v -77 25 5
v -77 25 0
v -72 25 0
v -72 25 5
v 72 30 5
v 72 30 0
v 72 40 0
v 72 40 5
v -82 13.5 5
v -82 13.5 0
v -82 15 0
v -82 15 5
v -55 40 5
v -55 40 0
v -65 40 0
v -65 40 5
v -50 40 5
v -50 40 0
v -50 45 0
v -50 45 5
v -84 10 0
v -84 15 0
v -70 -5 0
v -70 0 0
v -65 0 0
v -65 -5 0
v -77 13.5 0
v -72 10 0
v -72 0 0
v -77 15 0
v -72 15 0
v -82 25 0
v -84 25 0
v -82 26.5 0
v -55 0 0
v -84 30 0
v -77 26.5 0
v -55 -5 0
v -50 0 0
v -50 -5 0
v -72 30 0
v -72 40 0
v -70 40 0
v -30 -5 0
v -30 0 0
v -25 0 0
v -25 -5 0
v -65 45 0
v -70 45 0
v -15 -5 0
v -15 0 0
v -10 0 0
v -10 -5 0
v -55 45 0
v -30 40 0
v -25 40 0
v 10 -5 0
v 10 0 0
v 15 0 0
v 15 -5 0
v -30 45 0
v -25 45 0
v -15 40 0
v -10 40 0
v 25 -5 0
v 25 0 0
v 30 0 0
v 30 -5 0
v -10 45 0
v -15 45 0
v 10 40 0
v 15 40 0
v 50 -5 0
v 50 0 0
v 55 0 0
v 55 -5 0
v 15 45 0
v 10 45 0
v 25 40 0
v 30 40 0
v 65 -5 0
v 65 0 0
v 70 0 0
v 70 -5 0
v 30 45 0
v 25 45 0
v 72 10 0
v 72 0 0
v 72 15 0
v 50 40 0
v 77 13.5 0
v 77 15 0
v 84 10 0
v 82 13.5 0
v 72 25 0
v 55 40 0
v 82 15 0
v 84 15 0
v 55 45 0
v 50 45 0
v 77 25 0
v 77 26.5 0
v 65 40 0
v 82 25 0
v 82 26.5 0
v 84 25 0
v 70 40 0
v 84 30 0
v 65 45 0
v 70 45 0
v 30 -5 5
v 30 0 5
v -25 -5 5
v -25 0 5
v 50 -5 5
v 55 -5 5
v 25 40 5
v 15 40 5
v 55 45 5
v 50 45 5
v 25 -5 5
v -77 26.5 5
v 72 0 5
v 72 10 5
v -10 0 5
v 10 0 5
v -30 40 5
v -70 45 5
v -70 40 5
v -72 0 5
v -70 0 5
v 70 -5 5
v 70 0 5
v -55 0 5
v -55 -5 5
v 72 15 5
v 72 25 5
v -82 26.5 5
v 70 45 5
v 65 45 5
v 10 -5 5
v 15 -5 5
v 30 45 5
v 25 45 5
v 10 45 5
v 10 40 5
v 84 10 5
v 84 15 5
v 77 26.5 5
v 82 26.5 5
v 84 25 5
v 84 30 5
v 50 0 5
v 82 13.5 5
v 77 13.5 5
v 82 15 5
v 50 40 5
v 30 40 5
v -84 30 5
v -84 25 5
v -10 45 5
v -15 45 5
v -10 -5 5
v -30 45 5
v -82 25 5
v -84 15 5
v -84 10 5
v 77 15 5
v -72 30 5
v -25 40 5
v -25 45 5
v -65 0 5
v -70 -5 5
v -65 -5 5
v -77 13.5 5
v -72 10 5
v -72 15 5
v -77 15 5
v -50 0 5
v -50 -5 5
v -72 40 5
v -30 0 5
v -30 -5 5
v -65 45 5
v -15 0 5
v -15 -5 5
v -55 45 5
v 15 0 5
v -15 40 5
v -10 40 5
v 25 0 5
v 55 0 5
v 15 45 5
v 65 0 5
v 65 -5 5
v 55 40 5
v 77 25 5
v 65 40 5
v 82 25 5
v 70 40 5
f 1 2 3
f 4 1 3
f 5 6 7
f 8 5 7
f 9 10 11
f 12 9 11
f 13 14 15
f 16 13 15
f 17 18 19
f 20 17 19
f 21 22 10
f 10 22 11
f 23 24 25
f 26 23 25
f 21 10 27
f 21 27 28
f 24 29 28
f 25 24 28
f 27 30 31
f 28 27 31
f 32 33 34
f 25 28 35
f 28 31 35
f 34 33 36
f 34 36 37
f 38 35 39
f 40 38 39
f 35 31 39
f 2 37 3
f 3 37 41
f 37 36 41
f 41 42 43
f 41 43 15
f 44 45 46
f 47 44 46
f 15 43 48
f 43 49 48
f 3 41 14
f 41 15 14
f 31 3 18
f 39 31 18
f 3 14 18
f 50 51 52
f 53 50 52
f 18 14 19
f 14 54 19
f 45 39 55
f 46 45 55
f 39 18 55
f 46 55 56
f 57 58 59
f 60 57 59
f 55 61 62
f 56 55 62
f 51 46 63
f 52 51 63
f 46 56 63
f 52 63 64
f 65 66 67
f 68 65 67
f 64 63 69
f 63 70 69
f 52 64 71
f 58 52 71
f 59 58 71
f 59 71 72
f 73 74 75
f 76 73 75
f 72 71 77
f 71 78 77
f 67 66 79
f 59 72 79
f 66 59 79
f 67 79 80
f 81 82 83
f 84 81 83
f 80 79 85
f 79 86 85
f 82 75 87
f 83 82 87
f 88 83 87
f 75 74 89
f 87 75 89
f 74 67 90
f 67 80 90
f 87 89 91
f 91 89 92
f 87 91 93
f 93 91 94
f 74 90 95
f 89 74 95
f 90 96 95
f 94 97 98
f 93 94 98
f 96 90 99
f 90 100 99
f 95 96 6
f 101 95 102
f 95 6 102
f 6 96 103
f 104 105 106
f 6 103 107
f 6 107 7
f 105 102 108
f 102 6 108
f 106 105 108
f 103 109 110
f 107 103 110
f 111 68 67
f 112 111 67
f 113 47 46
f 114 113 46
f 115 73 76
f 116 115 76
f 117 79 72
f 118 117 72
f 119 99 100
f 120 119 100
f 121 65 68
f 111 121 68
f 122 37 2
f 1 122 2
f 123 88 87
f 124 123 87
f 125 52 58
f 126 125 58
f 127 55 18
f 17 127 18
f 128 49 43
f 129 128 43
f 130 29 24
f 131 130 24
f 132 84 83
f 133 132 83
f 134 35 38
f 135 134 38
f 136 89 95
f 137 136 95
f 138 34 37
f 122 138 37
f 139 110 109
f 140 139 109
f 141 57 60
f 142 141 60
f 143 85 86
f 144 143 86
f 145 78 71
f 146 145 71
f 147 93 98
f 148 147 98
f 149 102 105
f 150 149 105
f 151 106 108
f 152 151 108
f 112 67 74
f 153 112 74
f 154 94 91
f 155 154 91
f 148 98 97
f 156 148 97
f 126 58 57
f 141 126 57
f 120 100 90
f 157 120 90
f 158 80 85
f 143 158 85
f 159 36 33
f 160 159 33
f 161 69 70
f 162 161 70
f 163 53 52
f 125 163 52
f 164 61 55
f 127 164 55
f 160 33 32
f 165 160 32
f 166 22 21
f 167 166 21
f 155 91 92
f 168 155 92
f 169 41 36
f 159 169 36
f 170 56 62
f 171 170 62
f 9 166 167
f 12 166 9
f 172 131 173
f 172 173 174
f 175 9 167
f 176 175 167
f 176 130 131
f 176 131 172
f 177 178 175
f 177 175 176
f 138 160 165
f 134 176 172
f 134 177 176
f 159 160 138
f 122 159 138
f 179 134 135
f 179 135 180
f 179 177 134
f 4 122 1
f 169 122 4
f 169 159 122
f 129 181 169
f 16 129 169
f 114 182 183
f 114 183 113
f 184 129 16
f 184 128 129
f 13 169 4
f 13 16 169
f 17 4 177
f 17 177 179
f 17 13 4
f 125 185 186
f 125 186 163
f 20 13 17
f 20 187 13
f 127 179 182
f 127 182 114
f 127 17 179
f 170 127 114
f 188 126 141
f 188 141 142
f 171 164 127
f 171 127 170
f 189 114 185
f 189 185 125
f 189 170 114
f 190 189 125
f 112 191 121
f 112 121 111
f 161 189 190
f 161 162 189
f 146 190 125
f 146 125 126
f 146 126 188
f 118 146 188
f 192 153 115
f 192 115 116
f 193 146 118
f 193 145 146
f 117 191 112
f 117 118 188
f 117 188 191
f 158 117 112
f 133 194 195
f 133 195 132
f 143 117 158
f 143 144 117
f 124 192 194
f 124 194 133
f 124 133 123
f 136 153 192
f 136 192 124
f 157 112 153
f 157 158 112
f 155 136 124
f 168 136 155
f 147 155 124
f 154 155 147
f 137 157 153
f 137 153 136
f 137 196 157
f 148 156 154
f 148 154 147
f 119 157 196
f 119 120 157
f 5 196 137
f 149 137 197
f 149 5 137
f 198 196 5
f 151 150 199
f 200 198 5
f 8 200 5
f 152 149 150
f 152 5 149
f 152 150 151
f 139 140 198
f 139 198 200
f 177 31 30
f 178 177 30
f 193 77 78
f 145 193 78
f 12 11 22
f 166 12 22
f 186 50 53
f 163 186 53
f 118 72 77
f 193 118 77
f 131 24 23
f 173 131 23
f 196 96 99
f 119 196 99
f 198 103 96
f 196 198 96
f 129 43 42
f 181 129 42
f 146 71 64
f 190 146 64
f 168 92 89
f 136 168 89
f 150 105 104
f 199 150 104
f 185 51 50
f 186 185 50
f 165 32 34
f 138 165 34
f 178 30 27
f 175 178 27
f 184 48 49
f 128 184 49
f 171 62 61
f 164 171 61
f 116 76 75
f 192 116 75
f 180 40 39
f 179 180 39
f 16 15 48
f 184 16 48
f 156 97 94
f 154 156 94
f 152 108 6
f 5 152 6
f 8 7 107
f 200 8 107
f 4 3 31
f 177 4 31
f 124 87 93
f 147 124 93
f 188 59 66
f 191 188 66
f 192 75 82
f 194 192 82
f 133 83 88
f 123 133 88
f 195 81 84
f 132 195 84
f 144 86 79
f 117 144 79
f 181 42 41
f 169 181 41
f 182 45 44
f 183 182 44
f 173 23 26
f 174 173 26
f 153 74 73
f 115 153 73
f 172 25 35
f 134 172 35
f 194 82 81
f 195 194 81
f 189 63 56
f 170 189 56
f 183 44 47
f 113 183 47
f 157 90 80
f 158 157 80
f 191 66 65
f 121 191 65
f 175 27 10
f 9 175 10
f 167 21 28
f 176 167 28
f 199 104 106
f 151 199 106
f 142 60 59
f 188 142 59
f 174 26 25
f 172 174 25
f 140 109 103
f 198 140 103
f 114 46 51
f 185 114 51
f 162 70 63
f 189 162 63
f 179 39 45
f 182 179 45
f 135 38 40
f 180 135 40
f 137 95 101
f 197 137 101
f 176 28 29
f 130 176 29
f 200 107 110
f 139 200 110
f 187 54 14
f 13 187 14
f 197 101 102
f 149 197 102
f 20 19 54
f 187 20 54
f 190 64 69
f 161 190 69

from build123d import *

# Parameters (mm, degrees)
BOSS_EXTRU_1_DEPTH = 5


with BuildPart() as part:
    # Esquisse1 → Boss.-Extru.1 (new body)
    with BuildSketch(Plane.XY):
        Polygon((-70, 40), (-72, 40), (-72, 30), (-84, 30), (-84, 25), (-82, 25), (-82, 26.5), (-77, 26.5), (-77, 25), (-72, 25), (-72, 15), (-77, 15), (-77, 13.5), (-82, 13.5), (-82, 15), (-84, 15), (-84, 10), (-72, 10), (-72, 0), (-70, 0), (-70, -5), (-65, -5), (-65, 0), (-55, 0), (-55, -5), (-50, -5), (-50, 0), (-30, 0), (-30, -5), (-25, -5), (-25, 0), (-15, 0), (-15, -5), (-10, -5), (-10, 0), (10, 0), (10, -5), (15, -5), (15, 0), (25, 0), (25, -5), (30, -5), (30, 0), (50, 0), (50, -5), (55, -5), (55, 0), (65, 0), (65, -5), (70, -5), (70, 0), (72, 0), (72, 10), (84, 10), (84, 15), (82, 15), (82, 13.5), (77, 13.5), (77, 15), (72, 15), (72, 25), (77, 25), (77, 26.5), (82, 26.5), (82, 25), (84, 25), (84, 30), (72, 30), (72, 40), (70, 40), (70, 45), (65, 45), (65, 40), (55, 40), (55, 45), (50, 45), (50, 40), (30, 40), (30, 45), (25, 45), (25, 40), (15, 40), (15, 45), (10, 45), (10, 40), (-10, 40), (-10, 45), (-15, 45), (-15, 40), (-25, 40), (-25, 45), (-30, 45), (-30, 40), (-50, 40), (-50, 45), (-55, 45), (-55, 40), (-65, 40), (-65, 45), (-70, 45), align=None)
    extrude(amount=BOSS_EXTRU_1_DEPTH)


solid = part.part
